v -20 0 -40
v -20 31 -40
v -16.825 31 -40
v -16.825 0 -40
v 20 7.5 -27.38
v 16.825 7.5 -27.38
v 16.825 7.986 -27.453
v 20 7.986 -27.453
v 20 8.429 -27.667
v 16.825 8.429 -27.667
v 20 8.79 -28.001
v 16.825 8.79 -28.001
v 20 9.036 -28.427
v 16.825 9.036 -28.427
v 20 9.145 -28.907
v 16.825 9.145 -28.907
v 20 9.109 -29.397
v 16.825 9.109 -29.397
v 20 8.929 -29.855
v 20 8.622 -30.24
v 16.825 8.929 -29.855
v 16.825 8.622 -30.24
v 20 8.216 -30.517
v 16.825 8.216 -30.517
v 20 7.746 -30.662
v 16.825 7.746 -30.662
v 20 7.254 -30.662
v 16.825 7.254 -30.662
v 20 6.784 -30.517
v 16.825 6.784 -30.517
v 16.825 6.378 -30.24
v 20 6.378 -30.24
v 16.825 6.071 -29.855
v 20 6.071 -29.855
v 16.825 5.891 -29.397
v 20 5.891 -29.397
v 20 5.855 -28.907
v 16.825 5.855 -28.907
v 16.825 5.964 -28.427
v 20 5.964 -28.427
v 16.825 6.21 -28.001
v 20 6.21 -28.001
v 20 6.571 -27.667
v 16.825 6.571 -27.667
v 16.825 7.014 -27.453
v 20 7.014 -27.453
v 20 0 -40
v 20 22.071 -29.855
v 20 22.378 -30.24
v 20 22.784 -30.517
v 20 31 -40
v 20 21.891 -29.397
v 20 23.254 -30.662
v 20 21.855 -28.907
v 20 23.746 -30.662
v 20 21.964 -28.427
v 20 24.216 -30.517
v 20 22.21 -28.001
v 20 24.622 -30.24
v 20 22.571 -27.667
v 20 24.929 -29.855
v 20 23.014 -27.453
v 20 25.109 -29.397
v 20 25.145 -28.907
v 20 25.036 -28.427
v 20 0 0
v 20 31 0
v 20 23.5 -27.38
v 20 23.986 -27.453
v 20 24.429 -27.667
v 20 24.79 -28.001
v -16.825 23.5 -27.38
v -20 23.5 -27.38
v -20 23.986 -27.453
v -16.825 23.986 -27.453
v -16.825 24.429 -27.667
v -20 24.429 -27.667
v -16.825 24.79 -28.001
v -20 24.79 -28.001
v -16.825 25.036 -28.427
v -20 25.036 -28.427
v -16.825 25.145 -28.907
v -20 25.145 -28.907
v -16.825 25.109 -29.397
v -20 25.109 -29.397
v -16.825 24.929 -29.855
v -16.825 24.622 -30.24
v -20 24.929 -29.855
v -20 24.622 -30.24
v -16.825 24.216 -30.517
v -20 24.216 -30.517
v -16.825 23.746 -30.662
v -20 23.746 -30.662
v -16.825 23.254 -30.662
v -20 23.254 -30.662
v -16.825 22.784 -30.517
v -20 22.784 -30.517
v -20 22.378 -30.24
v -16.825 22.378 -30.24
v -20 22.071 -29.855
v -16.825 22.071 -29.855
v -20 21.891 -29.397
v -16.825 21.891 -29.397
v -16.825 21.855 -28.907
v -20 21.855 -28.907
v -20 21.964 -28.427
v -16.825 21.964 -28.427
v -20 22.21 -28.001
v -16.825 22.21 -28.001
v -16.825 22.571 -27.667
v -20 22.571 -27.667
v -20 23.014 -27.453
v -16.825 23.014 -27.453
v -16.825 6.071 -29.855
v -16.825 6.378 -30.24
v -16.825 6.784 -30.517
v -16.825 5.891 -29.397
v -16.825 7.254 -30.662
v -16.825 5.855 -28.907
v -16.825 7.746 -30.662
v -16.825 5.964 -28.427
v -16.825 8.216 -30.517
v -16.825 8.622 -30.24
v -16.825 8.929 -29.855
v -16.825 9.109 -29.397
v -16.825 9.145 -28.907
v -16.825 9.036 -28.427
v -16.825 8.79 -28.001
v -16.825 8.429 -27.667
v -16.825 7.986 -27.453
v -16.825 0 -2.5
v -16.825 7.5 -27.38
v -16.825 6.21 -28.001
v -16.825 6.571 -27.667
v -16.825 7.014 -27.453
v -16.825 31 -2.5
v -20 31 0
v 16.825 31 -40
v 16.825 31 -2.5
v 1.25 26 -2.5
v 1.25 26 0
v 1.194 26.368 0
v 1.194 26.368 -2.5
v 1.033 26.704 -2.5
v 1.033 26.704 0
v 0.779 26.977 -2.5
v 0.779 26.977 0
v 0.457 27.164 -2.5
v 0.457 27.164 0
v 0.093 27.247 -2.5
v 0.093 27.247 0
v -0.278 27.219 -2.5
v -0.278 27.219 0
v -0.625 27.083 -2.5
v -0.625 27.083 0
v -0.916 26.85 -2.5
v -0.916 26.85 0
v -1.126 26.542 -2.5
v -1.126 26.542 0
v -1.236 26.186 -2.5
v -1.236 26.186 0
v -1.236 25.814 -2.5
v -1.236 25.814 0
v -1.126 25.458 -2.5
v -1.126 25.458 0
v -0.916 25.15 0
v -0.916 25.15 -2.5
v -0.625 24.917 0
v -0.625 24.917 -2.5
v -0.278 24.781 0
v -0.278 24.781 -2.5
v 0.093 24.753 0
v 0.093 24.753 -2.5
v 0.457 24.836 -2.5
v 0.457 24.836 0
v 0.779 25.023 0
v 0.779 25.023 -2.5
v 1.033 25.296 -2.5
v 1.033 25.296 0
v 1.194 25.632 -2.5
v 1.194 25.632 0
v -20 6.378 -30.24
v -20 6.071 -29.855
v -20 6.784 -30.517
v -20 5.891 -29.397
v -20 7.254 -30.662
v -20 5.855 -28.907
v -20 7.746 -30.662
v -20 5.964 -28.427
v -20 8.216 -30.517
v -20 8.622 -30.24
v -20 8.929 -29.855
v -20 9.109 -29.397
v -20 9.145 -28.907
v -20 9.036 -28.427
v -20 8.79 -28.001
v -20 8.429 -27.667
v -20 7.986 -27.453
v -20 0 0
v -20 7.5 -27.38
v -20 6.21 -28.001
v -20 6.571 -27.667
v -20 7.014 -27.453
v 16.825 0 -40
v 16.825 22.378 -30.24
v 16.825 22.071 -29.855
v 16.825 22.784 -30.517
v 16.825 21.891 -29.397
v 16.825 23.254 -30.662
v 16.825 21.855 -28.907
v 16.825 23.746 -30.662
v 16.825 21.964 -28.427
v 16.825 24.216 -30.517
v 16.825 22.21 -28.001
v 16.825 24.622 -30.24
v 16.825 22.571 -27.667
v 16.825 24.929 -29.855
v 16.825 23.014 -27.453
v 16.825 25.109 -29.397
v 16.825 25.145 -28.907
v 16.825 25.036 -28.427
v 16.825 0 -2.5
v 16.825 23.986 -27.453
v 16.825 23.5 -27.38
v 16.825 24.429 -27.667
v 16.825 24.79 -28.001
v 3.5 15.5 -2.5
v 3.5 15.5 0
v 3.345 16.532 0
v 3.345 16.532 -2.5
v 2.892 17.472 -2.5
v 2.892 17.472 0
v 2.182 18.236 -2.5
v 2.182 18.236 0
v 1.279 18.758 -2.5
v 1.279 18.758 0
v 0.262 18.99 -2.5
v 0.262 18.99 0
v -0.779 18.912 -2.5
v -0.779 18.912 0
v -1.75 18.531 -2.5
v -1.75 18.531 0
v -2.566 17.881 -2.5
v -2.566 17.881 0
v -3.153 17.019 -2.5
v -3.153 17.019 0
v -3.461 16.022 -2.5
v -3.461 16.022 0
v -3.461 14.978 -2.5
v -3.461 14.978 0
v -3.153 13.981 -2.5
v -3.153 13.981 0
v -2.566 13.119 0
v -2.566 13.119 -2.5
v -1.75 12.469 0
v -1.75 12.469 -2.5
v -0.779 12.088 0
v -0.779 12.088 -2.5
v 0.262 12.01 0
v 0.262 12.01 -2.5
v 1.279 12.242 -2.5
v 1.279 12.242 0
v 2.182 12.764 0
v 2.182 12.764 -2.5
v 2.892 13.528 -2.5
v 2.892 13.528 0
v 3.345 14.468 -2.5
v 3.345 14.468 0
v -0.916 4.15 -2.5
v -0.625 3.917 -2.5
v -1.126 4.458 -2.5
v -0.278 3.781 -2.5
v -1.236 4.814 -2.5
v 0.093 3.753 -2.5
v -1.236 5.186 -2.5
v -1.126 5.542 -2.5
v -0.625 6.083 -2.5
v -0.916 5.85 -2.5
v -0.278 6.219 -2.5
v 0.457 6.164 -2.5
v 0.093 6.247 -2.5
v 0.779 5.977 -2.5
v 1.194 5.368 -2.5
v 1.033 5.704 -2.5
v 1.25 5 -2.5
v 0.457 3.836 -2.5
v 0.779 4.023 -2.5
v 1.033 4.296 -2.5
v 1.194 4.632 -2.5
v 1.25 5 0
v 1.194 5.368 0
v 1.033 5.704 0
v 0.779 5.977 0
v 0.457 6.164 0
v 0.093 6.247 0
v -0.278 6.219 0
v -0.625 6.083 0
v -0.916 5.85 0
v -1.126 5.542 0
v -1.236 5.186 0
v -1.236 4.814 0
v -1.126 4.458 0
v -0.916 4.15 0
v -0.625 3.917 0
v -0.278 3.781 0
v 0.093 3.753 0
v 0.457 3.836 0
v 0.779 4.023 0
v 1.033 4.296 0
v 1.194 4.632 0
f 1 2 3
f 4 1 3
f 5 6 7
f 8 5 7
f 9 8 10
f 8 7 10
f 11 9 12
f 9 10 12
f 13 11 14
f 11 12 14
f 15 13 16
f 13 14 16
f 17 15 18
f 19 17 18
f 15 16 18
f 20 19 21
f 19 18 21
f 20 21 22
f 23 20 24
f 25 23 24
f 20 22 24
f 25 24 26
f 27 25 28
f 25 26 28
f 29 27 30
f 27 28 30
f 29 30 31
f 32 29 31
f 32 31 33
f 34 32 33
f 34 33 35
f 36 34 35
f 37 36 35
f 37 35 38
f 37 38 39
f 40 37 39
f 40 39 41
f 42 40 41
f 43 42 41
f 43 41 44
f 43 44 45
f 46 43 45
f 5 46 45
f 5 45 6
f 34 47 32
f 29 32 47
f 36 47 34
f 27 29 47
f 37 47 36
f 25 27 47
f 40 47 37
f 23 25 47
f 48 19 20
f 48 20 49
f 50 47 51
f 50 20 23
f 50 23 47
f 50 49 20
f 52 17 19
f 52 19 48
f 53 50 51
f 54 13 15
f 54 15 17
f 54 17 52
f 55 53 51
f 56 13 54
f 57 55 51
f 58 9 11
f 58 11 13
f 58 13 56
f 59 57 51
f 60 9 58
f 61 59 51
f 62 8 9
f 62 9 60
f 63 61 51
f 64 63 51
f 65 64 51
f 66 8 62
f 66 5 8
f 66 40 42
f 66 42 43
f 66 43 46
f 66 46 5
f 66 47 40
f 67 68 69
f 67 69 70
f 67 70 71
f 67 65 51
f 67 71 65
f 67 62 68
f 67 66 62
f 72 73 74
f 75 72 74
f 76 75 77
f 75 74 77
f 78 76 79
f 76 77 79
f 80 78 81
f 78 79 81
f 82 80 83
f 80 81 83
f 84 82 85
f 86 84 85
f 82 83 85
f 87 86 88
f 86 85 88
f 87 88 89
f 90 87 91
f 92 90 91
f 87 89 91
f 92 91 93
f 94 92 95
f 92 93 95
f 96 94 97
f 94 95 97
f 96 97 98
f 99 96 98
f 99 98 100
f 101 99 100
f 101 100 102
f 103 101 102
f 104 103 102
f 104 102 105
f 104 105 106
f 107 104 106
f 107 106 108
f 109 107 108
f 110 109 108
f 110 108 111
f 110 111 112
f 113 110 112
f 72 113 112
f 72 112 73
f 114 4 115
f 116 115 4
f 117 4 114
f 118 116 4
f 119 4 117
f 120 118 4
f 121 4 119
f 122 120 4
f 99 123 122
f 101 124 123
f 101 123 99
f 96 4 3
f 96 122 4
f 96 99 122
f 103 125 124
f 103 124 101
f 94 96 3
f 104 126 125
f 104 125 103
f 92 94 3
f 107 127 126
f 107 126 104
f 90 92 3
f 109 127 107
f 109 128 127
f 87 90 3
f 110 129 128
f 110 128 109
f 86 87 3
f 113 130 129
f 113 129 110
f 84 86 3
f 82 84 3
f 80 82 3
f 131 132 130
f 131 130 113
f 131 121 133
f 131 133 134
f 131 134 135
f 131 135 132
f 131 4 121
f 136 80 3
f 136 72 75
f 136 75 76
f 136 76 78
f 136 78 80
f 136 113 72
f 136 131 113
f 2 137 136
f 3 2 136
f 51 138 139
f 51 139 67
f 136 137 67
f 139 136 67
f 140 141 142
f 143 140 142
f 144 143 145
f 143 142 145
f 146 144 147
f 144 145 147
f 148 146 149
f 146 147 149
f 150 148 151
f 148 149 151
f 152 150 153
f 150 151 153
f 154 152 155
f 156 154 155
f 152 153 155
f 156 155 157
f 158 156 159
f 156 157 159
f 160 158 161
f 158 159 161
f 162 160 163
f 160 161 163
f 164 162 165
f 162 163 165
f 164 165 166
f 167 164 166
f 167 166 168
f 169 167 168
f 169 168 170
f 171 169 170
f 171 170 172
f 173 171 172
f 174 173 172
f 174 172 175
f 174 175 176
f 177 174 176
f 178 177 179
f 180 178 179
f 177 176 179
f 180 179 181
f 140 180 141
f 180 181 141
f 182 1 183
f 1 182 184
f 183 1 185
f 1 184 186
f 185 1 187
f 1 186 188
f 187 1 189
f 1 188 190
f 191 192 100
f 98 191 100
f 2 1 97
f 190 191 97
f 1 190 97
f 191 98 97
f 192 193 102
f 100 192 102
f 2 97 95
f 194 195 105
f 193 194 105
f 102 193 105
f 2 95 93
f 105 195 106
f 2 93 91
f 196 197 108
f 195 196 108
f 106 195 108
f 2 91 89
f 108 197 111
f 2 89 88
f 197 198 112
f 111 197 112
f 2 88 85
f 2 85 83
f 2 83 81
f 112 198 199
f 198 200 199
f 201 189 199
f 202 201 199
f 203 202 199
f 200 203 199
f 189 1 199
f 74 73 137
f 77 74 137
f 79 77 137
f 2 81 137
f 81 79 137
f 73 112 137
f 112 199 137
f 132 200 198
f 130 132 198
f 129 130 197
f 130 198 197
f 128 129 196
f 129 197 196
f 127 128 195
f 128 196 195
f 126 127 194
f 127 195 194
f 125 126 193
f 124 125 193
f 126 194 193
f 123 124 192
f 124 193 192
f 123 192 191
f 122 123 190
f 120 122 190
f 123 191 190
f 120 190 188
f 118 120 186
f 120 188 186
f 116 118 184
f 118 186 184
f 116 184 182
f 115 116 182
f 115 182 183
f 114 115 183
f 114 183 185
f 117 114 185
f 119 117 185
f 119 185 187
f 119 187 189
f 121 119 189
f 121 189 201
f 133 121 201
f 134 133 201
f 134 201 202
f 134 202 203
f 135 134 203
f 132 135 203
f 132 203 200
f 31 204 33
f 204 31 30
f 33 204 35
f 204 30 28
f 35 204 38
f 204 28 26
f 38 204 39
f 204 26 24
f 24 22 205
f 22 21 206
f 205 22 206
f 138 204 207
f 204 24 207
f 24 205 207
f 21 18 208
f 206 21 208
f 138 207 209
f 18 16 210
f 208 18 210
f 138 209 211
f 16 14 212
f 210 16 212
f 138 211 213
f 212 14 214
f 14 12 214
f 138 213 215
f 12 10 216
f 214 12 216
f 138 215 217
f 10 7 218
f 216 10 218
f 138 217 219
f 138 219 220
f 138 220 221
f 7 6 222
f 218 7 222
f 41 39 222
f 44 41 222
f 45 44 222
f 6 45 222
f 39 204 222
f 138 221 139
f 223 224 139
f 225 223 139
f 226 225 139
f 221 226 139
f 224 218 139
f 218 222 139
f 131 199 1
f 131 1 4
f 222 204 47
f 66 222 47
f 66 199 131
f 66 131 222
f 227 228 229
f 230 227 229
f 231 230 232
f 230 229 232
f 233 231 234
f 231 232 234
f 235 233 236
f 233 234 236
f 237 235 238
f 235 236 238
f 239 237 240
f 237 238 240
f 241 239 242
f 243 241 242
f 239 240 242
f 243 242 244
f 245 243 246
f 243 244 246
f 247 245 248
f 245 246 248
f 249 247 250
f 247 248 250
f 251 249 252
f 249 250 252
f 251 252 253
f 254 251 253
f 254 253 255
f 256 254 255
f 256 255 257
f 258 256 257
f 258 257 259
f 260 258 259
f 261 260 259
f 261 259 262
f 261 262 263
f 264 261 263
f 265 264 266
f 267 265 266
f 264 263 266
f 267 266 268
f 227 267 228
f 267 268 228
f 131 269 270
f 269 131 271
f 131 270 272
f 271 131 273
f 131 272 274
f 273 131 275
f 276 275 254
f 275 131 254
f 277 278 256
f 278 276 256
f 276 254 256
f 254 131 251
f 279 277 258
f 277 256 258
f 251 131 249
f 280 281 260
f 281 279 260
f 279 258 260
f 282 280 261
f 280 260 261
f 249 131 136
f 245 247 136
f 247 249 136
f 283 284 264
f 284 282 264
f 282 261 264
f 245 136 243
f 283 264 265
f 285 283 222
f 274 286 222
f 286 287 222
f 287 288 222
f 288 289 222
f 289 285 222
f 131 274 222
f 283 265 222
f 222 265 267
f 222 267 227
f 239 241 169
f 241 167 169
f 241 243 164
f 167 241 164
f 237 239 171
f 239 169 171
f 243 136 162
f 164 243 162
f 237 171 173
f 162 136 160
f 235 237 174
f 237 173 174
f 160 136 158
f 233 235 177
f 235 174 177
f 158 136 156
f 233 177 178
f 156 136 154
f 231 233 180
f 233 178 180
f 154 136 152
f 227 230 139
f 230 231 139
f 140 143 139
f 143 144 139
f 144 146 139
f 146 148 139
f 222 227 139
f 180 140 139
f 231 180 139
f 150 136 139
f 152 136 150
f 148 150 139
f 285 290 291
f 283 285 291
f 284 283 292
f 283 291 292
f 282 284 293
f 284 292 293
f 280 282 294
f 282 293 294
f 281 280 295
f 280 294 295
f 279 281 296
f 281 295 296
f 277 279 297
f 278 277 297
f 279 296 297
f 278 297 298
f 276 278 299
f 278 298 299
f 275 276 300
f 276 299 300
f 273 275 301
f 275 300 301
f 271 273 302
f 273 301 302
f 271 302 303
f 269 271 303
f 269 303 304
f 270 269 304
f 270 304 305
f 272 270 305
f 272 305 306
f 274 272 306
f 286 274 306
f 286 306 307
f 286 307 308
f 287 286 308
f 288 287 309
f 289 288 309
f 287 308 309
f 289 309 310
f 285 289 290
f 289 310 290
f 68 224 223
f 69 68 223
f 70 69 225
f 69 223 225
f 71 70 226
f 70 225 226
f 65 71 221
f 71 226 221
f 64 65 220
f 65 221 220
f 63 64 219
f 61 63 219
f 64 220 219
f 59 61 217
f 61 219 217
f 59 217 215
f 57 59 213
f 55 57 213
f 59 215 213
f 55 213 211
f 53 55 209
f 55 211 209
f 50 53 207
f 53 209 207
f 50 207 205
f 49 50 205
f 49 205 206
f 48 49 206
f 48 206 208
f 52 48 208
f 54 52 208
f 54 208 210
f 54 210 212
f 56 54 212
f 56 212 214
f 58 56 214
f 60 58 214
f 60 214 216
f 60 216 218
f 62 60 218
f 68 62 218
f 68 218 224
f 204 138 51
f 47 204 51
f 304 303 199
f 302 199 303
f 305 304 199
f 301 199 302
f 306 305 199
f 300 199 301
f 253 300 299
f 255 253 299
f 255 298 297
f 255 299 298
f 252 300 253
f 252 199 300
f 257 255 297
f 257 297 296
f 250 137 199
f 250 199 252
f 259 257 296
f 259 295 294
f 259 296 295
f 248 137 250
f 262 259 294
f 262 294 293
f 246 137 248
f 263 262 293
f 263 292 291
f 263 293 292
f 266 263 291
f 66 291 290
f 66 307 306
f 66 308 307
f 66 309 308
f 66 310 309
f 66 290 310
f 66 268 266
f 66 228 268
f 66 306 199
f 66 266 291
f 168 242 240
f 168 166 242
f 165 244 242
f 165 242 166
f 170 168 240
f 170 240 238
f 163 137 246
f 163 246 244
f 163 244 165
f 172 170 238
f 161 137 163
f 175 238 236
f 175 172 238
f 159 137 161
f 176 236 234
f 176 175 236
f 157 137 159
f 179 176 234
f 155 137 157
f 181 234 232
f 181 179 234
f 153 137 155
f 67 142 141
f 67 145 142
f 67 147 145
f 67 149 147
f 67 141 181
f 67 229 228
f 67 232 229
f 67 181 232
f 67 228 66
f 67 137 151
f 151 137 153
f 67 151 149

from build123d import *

# Parameters (mm, degrees)
SKETCH3_W           = 33.65
SKETCH3_H           = 31
SKETCH3_R           = 1.25
SKETCH3_R_2         = 3.5
BOSS_EXTRUDE3_DEPTH = 2.5
SKETCH3_3_W         = 3.175
SKETCH3_3_H         = 31
BOSS_EXTRUDE4_DEPTH = 40
SKETCH4_R           = 1.65
CUT_EXTRUDE1_DEPTH  = 40


with BuildPart() as part:
    # Sketch3 → Boss-Extrude3 (new body)
    with BuildSketch(Plane.XY):
        with Locations((0, 15.5)):
            Rectangle(SKETCH3_W, SKETCH3_H)
        with Locations((0, 5)):
            Circle(SKETCH3_R, mode=Mode.SUBTRACT)
        with Locations((0, 15.5)):
            Circle(SKETCH3_R_2, mode=Mode.SUBTRACT)
        with Locations((0, 26)):
            Circle(SKETCH3_R, mode=Mode.SUBTRACT)
    extrude(amount=-BOSS_EXTRUDE3_DEPTH)

    # Sketch3<3> → Boss-Extrude4 (add)
    with BuildSketch(Plane.XY):
        with Locations((-18.4125, 15.5)):
            Rectangle(SKETCH3_3_W, SKETCH3_3_H)
        with Locations((18.4125, 15.5)):
            Rectangle(SKETCH3_3_W, SKETCH3_3_H)
    extrude(amount=-BOSS_EXTRUDE4_DEPTH)

    # Sketch4 → Cut-Extrude1 (cut)
    with BuildSketch(Plane.ZY.offset(20)):
        with Locations((-29.03, 23.5)):
            Circle(SKETCH4_R)
        with Locations((-29.03, 7.5)):
            Circle(SKETCH4_R)
    extrude(amount=-CUT_EXTRUDE1_DEPTH, mode=Mode.SUBTRACT)


solid = part.part
